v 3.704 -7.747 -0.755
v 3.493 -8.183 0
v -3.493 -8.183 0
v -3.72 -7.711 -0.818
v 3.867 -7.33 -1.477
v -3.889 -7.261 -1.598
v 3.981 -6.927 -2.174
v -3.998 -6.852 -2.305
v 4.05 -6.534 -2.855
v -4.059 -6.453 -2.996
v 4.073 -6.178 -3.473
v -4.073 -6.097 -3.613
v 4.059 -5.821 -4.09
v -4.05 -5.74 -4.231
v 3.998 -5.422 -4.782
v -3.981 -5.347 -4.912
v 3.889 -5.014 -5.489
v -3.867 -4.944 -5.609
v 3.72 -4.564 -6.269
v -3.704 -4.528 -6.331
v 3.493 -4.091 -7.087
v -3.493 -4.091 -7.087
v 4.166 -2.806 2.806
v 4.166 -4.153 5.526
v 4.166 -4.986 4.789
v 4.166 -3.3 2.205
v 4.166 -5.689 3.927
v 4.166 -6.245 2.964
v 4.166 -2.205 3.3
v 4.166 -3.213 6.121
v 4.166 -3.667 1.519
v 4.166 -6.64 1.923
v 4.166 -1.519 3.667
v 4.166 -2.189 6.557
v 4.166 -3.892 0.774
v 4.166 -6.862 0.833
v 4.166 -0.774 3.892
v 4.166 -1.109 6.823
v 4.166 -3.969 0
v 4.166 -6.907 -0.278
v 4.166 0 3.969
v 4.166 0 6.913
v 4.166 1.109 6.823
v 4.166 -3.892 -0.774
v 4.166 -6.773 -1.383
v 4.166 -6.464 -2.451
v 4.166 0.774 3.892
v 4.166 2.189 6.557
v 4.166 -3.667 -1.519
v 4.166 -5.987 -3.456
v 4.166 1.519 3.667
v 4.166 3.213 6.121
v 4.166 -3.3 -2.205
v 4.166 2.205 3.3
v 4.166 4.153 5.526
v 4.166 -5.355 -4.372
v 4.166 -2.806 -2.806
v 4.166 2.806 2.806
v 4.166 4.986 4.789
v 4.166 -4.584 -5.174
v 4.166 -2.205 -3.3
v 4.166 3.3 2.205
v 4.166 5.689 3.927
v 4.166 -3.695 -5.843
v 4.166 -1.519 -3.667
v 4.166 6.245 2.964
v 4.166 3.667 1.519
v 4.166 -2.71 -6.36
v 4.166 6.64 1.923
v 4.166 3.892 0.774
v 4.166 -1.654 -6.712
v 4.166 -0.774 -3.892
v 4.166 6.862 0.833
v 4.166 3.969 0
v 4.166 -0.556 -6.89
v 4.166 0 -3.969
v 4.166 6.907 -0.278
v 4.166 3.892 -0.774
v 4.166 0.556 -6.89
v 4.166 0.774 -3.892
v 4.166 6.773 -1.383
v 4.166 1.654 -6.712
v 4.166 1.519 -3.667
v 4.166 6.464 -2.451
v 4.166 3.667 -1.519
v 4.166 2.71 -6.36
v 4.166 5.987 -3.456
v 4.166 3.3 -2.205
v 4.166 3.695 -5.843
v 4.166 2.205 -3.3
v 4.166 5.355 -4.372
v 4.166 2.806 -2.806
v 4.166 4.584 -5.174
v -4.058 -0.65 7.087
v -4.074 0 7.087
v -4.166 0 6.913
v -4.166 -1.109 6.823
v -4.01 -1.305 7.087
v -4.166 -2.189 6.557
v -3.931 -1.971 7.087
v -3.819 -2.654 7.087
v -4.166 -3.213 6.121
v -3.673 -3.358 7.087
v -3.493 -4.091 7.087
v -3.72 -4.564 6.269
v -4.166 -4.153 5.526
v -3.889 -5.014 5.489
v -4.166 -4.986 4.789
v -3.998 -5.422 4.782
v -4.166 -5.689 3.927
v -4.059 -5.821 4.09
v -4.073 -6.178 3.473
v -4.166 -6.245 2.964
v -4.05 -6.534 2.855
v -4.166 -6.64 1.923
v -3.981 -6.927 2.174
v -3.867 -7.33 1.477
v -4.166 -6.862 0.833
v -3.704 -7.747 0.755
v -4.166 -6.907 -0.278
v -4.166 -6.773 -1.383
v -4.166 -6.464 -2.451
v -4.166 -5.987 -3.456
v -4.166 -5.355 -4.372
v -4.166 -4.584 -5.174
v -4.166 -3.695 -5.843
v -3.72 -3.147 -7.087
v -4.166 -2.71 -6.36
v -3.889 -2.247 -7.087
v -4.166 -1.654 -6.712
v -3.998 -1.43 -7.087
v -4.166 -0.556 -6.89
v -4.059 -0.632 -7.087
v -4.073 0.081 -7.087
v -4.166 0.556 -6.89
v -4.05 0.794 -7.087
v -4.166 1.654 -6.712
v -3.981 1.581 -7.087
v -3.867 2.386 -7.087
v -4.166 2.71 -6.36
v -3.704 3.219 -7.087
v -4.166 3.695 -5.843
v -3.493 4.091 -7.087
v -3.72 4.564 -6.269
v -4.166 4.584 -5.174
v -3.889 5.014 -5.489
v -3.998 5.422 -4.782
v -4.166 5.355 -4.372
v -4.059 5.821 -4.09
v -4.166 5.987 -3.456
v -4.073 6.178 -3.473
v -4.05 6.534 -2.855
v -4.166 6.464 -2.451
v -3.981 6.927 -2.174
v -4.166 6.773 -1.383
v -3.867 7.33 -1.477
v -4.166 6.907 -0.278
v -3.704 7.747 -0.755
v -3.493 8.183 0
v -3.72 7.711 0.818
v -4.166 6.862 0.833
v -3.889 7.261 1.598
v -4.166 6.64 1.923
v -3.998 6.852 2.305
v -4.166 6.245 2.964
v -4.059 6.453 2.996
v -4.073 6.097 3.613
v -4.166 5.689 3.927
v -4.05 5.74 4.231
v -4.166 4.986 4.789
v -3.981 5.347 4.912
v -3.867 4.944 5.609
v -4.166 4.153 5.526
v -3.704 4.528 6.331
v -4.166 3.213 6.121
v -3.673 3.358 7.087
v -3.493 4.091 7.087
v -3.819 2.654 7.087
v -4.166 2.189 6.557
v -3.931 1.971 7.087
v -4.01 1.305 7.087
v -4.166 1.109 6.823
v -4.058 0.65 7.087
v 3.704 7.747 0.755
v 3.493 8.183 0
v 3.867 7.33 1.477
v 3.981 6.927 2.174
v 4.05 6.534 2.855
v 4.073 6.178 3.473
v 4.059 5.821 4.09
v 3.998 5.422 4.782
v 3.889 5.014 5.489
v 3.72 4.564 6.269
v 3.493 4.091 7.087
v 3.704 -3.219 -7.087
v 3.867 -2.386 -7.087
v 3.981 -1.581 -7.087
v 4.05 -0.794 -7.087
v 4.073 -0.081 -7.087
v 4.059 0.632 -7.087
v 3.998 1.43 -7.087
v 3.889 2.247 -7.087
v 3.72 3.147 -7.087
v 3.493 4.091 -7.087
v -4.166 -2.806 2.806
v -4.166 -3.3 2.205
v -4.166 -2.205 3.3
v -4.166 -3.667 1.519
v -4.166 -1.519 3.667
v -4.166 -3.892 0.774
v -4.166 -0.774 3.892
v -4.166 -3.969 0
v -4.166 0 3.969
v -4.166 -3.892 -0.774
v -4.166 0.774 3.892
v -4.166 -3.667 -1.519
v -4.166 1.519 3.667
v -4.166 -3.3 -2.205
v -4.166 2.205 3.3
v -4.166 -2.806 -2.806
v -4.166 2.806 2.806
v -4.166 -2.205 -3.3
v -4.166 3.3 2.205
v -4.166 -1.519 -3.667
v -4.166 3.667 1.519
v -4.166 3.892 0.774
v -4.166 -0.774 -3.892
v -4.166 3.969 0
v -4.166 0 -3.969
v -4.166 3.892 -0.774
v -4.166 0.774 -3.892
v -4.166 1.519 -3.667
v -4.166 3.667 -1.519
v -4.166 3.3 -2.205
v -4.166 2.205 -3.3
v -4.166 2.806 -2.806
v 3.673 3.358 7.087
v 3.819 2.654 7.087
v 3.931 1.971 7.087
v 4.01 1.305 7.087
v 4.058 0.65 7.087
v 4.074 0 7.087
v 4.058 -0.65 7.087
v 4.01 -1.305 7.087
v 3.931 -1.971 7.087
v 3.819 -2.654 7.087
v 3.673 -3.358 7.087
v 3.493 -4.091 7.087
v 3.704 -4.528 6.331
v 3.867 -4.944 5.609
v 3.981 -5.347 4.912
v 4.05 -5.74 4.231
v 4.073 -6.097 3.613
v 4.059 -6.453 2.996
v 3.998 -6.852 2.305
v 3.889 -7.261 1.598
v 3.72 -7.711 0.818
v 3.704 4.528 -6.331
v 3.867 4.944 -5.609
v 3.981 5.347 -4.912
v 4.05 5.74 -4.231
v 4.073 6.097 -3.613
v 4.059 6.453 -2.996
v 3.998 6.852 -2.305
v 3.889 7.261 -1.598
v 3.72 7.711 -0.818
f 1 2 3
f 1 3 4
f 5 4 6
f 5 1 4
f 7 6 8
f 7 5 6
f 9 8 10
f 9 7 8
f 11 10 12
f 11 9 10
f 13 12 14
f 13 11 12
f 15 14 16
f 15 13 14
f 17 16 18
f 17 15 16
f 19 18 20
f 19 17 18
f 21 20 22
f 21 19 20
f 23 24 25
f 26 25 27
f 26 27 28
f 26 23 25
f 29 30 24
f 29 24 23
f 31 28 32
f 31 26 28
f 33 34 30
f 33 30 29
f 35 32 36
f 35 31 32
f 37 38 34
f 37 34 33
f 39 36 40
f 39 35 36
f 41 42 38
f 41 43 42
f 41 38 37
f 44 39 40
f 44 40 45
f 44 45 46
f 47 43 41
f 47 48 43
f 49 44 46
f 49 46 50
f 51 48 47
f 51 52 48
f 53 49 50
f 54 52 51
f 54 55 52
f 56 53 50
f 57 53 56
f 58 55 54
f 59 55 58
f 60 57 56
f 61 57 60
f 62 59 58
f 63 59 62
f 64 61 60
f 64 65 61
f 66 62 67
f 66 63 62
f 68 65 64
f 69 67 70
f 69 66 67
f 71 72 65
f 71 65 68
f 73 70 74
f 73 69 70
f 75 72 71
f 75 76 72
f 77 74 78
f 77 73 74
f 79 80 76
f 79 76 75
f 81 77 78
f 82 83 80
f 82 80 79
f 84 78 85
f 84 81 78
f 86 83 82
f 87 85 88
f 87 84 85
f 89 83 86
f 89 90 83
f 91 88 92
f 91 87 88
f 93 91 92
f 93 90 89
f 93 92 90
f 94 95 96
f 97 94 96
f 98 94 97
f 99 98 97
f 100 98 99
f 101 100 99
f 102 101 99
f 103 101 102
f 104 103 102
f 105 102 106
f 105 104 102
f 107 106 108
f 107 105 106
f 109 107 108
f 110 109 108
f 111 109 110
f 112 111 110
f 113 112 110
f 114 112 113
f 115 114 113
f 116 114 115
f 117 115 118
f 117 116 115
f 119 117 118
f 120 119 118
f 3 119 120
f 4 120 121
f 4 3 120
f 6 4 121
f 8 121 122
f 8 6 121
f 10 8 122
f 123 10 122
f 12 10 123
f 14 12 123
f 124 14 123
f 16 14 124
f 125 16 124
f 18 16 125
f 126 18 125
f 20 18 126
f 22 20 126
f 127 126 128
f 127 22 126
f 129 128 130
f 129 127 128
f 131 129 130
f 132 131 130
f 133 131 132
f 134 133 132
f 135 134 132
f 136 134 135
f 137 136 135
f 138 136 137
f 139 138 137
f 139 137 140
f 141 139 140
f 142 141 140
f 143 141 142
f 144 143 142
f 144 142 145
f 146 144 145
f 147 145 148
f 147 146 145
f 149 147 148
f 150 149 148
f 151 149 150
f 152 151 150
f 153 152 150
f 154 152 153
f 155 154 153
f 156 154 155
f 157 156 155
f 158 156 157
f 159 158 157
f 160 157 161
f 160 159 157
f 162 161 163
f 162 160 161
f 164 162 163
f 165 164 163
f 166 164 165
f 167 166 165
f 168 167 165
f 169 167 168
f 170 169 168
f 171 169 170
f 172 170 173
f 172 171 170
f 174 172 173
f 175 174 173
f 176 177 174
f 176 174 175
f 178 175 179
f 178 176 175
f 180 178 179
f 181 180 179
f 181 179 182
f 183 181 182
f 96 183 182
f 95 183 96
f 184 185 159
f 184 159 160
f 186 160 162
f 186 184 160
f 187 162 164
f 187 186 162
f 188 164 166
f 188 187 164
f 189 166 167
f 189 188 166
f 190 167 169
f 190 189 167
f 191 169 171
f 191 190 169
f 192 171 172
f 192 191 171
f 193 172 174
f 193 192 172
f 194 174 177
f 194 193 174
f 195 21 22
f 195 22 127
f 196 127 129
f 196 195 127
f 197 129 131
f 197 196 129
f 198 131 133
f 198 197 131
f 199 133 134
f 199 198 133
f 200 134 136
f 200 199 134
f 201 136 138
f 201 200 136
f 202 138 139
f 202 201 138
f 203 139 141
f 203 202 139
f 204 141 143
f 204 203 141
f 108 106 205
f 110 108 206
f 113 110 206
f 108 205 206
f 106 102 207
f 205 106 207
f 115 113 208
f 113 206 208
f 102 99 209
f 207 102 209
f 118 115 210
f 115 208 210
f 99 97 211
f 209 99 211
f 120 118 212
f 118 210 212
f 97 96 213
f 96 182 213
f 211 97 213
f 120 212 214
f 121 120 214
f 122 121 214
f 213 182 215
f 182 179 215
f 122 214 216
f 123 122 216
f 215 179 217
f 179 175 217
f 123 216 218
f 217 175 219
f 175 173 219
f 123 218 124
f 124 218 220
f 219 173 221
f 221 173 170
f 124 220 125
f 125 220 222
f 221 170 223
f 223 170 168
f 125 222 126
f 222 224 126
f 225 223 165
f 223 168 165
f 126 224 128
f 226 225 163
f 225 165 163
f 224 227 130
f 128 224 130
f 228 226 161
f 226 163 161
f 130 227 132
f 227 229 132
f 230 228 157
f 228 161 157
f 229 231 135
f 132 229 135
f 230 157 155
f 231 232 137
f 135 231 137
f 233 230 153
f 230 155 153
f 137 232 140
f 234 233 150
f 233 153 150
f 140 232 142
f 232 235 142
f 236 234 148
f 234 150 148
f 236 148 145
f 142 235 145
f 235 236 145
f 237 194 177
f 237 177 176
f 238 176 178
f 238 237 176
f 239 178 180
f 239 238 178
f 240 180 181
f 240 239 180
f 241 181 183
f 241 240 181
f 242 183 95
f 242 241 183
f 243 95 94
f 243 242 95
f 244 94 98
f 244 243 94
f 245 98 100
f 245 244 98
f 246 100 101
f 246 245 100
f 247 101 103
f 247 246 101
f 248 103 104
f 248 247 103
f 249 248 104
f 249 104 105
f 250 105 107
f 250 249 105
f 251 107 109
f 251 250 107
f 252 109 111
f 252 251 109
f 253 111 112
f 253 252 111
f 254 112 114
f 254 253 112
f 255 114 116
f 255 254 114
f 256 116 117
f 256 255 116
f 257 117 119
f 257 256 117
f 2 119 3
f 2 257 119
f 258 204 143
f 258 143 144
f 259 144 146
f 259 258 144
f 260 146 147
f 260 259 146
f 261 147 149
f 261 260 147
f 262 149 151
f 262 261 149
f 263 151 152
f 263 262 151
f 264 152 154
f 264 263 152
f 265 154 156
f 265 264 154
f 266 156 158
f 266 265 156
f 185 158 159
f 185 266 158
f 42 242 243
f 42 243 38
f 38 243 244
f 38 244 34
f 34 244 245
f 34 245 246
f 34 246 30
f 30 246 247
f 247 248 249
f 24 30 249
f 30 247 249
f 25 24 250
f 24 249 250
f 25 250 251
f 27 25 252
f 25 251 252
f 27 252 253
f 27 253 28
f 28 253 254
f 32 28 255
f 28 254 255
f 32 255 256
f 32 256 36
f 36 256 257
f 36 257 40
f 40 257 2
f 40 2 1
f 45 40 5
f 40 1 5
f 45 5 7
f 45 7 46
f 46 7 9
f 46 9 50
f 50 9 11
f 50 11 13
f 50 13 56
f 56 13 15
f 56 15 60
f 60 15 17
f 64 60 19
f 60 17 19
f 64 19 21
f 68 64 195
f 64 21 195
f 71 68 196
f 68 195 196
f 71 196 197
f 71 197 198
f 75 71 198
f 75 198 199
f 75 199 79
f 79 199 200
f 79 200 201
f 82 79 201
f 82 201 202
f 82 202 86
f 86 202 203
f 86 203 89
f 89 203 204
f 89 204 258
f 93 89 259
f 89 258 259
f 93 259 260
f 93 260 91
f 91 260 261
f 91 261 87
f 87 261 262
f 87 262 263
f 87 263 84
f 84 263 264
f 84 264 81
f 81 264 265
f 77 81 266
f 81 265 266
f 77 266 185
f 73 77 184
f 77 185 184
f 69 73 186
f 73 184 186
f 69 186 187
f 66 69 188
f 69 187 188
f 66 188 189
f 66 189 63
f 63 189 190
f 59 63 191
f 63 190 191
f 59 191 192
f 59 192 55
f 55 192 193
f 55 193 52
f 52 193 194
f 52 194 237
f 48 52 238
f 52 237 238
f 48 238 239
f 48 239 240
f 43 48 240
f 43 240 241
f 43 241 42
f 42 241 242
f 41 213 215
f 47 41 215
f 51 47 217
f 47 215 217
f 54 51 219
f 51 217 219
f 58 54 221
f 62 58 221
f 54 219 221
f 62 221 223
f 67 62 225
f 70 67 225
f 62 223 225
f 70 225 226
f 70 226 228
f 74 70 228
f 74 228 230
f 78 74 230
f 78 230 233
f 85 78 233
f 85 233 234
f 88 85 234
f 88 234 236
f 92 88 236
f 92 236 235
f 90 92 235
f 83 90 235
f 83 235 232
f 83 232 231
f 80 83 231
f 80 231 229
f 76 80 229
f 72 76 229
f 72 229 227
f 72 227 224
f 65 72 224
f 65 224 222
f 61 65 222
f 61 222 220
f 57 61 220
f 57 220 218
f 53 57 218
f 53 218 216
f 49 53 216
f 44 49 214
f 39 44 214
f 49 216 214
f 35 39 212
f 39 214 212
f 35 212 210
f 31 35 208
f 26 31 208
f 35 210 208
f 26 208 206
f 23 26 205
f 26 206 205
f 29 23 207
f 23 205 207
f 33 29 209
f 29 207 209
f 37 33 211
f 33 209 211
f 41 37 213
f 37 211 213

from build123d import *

# Parameters (mm, degrees)
BASE_DEPTH              = 4.1656
F_3_8_16_TAPPED_HOLE1_D = 7.9375


with BuildPart() as part:
    # Sketch1 → BASE (new, symmetric)
    with BuildSketch(Plane(origin=(0, 0, 0), x_dir=(0, 0, -1), z_dir=(1, 0, 0))):
        Polygon((0, 8.182900835), (-7.0866, 4.091450418), (-7.0866, -4.091450418), (0, -8.182900835), (7.0866, -4.091450418), (7.0866, 4.091450418), align=None)
    extrude(amount=BASE_DEPTH, both=True)

    # Sketch2 → EDGE-CUT (revolve, cut)
    with BuildSketch(Plane.XY, mode=Mode.PRIVATE) as edge_cut_sk:
        Polygon((4.1656, 6.912900835), (3.49291061, 8.182900835), (4.1656, 8.182900835), align=None)
    edge_cut = revolve(edge_cut_sk.sketch.rotate(Axis((0, 0, 0), (1, 0, 0)), 90), axis=Axis((0, 0, 0), (1, 0, 0)), mode=Mode.SUBTRACT)

    # Mirror1: EDGE-CUT across plane
    add(edge_cut.mirror(Plane(origin=(0, 0, 0), x_dir=(0, 0, 1), z_dir=(1, 0, 0))), mode=Mode.SUBTRACT)

    # 3/8-16 Tapped Hole1 (through all)
    with Locations(Plane(origin=(4.1656, 0, 0), x_dir=(0, 0, -1), z_dir=(1, 0, 0))):
        with Locations((0, 0)):
            Hole(F_3_8_16_TAPPED_HOLE1_D / 2)


solid = part.part
